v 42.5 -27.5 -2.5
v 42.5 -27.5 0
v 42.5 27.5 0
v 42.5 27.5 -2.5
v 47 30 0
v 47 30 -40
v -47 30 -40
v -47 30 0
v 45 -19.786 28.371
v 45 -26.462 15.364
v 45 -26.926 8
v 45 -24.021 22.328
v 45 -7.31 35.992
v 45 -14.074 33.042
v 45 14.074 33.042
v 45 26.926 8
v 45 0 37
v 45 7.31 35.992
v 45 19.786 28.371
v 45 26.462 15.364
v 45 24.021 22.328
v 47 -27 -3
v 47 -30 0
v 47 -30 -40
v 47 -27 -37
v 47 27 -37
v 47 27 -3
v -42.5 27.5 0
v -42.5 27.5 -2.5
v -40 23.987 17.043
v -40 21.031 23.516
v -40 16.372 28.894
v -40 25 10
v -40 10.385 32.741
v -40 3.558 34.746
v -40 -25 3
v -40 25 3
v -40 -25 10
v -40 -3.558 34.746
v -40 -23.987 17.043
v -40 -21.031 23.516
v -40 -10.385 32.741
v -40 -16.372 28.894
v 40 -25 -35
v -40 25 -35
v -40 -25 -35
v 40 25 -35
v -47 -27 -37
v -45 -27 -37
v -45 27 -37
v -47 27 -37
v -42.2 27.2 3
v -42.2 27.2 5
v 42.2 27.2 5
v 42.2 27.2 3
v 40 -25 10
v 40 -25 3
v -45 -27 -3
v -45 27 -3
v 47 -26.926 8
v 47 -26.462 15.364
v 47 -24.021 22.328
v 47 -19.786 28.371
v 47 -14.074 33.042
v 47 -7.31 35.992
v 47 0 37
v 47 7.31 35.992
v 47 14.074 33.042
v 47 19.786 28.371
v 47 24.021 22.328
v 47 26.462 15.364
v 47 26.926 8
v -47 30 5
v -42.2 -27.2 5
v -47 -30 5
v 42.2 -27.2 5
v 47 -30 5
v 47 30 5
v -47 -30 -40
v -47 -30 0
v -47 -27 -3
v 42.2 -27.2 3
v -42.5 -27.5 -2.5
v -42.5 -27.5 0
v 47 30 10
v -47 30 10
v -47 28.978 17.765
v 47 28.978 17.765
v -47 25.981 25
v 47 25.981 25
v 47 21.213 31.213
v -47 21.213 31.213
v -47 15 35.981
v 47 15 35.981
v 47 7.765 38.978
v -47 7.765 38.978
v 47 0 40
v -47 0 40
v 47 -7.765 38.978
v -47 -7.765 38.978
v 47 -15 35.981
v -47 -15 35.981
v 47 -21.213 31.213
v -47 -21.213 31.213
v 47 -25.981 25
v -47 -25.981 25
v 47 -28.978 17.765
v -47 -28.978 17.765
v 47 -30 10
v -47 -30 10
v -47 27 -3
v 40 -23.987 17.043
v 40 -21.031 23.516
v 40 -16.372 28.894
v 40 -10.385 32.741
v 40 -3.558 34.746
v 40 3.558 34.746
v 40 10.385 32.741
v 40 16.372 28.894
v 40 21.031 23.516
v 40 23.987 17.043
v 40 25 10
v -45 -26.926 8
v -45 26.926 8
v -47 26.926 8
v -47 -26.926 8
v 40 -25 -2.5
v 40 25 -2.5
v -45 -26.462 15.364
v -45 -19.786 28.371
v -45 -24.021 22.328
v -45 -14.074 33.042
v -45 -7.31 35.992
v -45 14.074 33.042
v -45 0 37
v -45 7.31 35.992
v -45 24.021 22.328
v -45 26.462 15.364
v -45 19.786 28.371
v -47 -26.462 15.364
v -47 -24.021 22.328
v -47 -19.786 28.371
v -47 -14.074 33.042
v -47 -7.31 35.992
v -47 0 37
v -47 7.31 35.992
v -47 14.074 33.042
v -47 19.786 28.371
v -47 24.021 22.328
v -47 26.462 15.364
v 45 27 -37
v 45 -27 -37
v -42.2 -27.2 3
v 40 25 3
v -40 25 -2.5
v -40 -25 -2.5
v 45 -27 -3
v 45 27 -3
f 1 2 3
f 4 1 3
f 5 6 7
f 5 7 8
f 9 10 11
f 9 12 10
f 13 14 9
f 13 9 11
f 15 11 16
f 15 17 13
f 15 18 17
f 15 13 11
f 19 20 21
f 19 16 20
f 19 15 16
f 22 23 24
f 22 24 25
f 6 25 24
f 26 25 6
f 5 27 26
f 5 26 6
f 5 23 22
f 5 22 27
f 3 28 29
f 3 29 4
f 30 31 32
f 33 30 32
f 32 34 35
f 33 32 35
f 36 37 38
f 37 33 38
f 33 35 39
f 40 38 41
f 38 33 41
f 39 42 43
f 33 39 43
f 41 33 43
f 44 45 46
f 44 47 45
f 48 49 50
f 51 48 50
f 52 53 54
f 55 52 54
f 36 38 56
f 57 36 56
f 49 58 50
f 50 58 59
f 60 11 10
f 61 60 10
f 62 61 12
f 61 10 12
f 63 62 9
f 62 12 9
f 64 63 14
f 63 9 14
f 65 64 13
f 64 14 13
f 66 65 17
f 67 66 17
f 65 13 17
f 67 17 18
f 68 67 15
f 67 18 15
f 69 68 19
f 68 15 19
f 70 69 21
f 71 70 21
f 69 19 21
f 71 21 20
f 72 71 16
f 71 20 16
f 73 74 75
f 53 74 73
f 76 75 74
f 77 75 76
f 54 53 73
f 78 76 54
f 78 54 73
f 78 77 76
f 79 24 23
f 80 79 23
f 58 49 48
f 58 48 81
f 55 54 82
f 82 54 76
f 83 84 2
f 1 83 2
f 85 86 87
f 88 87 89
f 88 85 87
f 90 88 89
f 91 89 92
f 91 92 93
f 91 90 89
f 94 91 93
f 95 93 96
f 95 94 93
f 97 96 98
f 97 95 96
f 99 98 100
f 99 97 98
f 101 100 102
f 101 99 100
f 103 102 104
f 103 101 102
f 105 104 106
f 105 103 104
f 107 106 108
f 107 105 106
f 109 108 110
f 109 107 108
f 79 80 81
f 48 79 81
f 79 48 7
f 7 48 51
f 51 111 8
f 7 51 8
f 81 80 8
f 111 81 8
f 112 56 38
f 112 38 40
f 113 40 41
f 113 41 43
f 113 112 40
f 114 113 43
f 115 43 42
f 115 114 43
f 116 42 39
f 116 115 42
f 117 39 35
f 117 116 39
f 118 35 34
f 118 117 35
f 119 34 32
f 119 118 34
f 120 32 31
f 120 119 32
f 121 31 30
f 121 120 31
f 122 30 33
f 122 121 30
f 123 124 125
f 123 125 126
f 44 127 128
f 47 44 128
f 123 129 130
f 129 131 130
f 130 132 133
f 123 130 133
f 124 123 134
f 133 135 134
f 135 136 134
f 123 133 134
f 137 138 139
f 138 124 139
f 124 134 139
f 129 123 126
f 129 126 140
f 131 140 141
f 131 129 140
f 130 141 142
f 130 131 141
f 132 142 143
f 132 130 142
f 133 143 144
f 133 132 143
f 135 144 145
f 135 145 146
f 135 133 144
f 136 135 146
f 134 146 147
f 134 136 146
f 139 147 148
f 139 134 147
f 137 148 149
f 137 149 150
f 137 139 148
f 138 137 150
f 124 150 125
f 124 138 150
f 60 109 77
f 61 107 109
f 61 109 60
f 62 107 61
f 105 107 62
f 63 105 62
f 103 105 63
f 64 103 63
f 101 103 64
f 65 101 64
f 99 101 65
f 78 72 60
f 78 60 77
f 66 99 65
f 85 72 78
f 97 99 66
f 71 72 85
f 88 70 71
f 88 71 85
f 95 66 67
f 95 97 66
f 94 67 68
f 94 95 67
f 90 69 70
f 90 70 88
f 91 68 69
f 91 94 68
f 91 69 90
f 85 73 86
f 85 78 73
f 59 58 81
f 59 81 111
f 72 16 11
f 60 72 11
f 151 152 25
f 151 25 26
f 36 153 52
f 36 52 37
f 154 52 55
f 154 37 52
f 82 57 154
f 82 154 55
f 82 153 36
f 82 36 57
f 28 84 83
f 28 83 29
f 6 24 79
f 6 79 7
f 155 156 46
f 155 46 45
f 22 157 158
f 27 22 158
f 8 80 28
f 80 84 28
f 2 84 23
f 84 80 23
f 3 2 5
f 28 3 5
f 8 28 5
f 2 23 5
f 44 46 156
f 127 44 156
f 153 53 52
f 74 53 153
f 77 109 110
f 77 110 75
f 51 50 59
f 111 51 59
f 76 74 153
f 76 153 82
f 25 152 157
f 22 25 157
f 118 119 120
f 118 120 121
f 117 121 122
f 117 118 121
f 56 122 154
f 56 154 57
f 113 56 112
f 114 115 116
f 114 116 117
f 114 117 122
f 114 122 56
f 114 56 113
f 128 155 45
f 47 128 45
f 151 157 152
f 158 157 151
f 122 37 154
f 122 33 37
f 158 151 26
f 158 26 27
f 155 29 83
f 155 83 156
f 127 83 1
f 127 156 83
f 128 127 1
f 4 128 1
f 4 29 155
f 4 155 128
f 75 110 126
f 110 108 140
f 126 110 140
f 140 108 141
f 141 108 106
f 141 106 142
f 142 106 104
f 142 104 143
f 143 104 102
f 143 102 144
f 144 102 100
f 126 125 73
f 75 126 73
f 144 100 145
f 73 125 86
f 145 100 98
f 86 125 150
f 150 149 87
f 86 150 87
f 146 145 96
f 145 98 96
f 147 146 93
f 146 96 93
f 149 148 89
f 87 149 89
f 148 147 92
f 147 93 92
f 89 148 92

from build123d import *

# Parameters (mm, degrees)
F1_DEPTH  = 40
F2_W      = 60
F2_H      = 40
F3_DEPTH  = 5
F4_W      = 85
F4_H      = 54.9999991059
F4_W_2    = 80
F4_H_2    = 49.9999991059
F5_DEPTH  = 2.5
F8_DEPTH  = 40
F10_DEPTH = 5
F11_W     = 84.4
F11_H     = 54.4
F11_W_2   = 80
F11_H_2   = 50
F12_DEPTH = 2
F14_DEPTH = 2
F15_W     = 60
F15_H     = 40
F15_W_2   = 54
F15_H_2   = 34
F16_DEPTH = 2


# Not quite as in the source:
# - a pattern or mirror of a feature is missing from the dataset's text; its kind, count and spacing are read off the source's solid


with BuildPart() as f1:
    # F0 (on Right) → F1 (new body, symmetric)
    with BuildSketch(Plane.YZ):
        Polygon((-24.999999553, 0), (-30, 0), (-30, -40), (30, -40), (30, 0), (24.999999553, 0), (24.999999553, -34.999999553), (-24.999999553, -34.999999553), align=None)
    extrude(amount=F1_DEPTH, both=True)

    # F2 (on face) → F3 (join)
    with BuildSketch(Plane.YZ.offset(40)):
        with Locations((0, -20)):
            Rectangle(F2_W, F2_H)
    f3 = extrude(amount=F3_DEPTH)

    # F3_copies: F3 across plane
    add(f3.mirror(Plane(origin=(0, 0, 0), x_dir=(0, 0, -1), z_dir=(-1, 0, 0))))

    # F4 (on face) → F5 (cut)
    with BuildSketch(Plane.XY):
        Rectangle(F4_W, F4_H)
        Rectangle(F4_W_2, F4_H_2, mode=Mode.SUBTRACT)
    extrude(amount=-F5_DEPTH, mode=Mode.SUBTRACT)

    # F15 (on face) → F16 (join)
    with BuildSketch(Plane.YZ.offset(45)):
        with Locations((0, -20)):
            Rectangle(F15_W, F15_H)
        with Locations((0, -20)):
            Rectangle(F15_W_2, F15_H_2, mode=Mode.SUBTRACT)
    f16 = extrude(amount=F16_DEPTH)

    # F16_copies: F16 across plane
    add(f16.mirror(Plane(origin=(0, 0, 0), x_dir=(0, 0, -1), z_dir=(-1, 0, 0))))


with BuildPart() as f8:
    # F7 (on Right) → F8 (new body, symmetric)
    with BuildSketch(Plane.YZ):
        with BuildLine():
            Line((-30, 10), (-30, 5))
            Line((-30, 5), (-25, 5))
            Line((-25, 5), (-25, 10))
            ThreePointArc((-25, 10), (0, 35), (25, 10))
            Line((25, 10), (25, 5))
            Line((25, 5), (30, 5))
            Line((30, 5), (30, 10))
            ThreePointArc((30, 10), (0, 40), (-30, 10))
        make_face()
    extrude(amount=F8_DEPTH, both=True)

    # F9 (on face) → F10 (join)
    with BuildSketch(Plane.YZ.offset(40)):
        with BuildLine():
            Line((30, 5), (30, 10))
            ThreePointArc((30, 10), (0, 40), (-30, 10))
            Line((-30, 10), (-30, 5))
            Line((-30, 5), (30, 5))
        make_face()
    f10 = extrude(amount=F10_DEPTH)

    # F10_copies: F10 across plane
    add(f10.mirror(Plane(origin=(0, 0, 0), x_dir=(0, 0, -1), z_dir=(-1, 0, 0))))

    # F11 (on face) → F12 (join)
    with BuildSketch(Plane(origin=(0, 0, 5), x_dir=(1, 0, 0), z_dir=(0, 0, -1))):
        Rectangle(F11_W, F11_H)
        Rectangle(F11_W_2, F11_H_2, mode=Mode.SUBTRACT)
    extrude(amount=F12_DEPTH)

    # F13 (on face) → F14 (join)
    with BuildSketch(Plane.YZ.offset(45)):
        with BuildLine():
            ThreePointArc((30, 10), (0, 40), (-30, 10))
            Line((-30, 10), (-30, 5))
            Line((-30, 5), (30, 5))
            Line((30, 5), (30, 10))
        make_face()
        with BuildLine():
            ThreePointArc((-26.9258240357, 8), (0, 37), (26.9258240357, 8))
            Line((26.9258240357, 8), (-26.9258240357, 8))
        make_face(mode=Mode.SUBTRACT)
    f14 = extrude(amount=F14_DEPTH)

    # F14_copies: F14 across plane
    add(f14.mirror(Plane(origin=(0, 0, 0), x_dir=(0, 0, -1), z_dir=(-1, 0, 0))))


solid = Compound([f1.part, f8.part])
